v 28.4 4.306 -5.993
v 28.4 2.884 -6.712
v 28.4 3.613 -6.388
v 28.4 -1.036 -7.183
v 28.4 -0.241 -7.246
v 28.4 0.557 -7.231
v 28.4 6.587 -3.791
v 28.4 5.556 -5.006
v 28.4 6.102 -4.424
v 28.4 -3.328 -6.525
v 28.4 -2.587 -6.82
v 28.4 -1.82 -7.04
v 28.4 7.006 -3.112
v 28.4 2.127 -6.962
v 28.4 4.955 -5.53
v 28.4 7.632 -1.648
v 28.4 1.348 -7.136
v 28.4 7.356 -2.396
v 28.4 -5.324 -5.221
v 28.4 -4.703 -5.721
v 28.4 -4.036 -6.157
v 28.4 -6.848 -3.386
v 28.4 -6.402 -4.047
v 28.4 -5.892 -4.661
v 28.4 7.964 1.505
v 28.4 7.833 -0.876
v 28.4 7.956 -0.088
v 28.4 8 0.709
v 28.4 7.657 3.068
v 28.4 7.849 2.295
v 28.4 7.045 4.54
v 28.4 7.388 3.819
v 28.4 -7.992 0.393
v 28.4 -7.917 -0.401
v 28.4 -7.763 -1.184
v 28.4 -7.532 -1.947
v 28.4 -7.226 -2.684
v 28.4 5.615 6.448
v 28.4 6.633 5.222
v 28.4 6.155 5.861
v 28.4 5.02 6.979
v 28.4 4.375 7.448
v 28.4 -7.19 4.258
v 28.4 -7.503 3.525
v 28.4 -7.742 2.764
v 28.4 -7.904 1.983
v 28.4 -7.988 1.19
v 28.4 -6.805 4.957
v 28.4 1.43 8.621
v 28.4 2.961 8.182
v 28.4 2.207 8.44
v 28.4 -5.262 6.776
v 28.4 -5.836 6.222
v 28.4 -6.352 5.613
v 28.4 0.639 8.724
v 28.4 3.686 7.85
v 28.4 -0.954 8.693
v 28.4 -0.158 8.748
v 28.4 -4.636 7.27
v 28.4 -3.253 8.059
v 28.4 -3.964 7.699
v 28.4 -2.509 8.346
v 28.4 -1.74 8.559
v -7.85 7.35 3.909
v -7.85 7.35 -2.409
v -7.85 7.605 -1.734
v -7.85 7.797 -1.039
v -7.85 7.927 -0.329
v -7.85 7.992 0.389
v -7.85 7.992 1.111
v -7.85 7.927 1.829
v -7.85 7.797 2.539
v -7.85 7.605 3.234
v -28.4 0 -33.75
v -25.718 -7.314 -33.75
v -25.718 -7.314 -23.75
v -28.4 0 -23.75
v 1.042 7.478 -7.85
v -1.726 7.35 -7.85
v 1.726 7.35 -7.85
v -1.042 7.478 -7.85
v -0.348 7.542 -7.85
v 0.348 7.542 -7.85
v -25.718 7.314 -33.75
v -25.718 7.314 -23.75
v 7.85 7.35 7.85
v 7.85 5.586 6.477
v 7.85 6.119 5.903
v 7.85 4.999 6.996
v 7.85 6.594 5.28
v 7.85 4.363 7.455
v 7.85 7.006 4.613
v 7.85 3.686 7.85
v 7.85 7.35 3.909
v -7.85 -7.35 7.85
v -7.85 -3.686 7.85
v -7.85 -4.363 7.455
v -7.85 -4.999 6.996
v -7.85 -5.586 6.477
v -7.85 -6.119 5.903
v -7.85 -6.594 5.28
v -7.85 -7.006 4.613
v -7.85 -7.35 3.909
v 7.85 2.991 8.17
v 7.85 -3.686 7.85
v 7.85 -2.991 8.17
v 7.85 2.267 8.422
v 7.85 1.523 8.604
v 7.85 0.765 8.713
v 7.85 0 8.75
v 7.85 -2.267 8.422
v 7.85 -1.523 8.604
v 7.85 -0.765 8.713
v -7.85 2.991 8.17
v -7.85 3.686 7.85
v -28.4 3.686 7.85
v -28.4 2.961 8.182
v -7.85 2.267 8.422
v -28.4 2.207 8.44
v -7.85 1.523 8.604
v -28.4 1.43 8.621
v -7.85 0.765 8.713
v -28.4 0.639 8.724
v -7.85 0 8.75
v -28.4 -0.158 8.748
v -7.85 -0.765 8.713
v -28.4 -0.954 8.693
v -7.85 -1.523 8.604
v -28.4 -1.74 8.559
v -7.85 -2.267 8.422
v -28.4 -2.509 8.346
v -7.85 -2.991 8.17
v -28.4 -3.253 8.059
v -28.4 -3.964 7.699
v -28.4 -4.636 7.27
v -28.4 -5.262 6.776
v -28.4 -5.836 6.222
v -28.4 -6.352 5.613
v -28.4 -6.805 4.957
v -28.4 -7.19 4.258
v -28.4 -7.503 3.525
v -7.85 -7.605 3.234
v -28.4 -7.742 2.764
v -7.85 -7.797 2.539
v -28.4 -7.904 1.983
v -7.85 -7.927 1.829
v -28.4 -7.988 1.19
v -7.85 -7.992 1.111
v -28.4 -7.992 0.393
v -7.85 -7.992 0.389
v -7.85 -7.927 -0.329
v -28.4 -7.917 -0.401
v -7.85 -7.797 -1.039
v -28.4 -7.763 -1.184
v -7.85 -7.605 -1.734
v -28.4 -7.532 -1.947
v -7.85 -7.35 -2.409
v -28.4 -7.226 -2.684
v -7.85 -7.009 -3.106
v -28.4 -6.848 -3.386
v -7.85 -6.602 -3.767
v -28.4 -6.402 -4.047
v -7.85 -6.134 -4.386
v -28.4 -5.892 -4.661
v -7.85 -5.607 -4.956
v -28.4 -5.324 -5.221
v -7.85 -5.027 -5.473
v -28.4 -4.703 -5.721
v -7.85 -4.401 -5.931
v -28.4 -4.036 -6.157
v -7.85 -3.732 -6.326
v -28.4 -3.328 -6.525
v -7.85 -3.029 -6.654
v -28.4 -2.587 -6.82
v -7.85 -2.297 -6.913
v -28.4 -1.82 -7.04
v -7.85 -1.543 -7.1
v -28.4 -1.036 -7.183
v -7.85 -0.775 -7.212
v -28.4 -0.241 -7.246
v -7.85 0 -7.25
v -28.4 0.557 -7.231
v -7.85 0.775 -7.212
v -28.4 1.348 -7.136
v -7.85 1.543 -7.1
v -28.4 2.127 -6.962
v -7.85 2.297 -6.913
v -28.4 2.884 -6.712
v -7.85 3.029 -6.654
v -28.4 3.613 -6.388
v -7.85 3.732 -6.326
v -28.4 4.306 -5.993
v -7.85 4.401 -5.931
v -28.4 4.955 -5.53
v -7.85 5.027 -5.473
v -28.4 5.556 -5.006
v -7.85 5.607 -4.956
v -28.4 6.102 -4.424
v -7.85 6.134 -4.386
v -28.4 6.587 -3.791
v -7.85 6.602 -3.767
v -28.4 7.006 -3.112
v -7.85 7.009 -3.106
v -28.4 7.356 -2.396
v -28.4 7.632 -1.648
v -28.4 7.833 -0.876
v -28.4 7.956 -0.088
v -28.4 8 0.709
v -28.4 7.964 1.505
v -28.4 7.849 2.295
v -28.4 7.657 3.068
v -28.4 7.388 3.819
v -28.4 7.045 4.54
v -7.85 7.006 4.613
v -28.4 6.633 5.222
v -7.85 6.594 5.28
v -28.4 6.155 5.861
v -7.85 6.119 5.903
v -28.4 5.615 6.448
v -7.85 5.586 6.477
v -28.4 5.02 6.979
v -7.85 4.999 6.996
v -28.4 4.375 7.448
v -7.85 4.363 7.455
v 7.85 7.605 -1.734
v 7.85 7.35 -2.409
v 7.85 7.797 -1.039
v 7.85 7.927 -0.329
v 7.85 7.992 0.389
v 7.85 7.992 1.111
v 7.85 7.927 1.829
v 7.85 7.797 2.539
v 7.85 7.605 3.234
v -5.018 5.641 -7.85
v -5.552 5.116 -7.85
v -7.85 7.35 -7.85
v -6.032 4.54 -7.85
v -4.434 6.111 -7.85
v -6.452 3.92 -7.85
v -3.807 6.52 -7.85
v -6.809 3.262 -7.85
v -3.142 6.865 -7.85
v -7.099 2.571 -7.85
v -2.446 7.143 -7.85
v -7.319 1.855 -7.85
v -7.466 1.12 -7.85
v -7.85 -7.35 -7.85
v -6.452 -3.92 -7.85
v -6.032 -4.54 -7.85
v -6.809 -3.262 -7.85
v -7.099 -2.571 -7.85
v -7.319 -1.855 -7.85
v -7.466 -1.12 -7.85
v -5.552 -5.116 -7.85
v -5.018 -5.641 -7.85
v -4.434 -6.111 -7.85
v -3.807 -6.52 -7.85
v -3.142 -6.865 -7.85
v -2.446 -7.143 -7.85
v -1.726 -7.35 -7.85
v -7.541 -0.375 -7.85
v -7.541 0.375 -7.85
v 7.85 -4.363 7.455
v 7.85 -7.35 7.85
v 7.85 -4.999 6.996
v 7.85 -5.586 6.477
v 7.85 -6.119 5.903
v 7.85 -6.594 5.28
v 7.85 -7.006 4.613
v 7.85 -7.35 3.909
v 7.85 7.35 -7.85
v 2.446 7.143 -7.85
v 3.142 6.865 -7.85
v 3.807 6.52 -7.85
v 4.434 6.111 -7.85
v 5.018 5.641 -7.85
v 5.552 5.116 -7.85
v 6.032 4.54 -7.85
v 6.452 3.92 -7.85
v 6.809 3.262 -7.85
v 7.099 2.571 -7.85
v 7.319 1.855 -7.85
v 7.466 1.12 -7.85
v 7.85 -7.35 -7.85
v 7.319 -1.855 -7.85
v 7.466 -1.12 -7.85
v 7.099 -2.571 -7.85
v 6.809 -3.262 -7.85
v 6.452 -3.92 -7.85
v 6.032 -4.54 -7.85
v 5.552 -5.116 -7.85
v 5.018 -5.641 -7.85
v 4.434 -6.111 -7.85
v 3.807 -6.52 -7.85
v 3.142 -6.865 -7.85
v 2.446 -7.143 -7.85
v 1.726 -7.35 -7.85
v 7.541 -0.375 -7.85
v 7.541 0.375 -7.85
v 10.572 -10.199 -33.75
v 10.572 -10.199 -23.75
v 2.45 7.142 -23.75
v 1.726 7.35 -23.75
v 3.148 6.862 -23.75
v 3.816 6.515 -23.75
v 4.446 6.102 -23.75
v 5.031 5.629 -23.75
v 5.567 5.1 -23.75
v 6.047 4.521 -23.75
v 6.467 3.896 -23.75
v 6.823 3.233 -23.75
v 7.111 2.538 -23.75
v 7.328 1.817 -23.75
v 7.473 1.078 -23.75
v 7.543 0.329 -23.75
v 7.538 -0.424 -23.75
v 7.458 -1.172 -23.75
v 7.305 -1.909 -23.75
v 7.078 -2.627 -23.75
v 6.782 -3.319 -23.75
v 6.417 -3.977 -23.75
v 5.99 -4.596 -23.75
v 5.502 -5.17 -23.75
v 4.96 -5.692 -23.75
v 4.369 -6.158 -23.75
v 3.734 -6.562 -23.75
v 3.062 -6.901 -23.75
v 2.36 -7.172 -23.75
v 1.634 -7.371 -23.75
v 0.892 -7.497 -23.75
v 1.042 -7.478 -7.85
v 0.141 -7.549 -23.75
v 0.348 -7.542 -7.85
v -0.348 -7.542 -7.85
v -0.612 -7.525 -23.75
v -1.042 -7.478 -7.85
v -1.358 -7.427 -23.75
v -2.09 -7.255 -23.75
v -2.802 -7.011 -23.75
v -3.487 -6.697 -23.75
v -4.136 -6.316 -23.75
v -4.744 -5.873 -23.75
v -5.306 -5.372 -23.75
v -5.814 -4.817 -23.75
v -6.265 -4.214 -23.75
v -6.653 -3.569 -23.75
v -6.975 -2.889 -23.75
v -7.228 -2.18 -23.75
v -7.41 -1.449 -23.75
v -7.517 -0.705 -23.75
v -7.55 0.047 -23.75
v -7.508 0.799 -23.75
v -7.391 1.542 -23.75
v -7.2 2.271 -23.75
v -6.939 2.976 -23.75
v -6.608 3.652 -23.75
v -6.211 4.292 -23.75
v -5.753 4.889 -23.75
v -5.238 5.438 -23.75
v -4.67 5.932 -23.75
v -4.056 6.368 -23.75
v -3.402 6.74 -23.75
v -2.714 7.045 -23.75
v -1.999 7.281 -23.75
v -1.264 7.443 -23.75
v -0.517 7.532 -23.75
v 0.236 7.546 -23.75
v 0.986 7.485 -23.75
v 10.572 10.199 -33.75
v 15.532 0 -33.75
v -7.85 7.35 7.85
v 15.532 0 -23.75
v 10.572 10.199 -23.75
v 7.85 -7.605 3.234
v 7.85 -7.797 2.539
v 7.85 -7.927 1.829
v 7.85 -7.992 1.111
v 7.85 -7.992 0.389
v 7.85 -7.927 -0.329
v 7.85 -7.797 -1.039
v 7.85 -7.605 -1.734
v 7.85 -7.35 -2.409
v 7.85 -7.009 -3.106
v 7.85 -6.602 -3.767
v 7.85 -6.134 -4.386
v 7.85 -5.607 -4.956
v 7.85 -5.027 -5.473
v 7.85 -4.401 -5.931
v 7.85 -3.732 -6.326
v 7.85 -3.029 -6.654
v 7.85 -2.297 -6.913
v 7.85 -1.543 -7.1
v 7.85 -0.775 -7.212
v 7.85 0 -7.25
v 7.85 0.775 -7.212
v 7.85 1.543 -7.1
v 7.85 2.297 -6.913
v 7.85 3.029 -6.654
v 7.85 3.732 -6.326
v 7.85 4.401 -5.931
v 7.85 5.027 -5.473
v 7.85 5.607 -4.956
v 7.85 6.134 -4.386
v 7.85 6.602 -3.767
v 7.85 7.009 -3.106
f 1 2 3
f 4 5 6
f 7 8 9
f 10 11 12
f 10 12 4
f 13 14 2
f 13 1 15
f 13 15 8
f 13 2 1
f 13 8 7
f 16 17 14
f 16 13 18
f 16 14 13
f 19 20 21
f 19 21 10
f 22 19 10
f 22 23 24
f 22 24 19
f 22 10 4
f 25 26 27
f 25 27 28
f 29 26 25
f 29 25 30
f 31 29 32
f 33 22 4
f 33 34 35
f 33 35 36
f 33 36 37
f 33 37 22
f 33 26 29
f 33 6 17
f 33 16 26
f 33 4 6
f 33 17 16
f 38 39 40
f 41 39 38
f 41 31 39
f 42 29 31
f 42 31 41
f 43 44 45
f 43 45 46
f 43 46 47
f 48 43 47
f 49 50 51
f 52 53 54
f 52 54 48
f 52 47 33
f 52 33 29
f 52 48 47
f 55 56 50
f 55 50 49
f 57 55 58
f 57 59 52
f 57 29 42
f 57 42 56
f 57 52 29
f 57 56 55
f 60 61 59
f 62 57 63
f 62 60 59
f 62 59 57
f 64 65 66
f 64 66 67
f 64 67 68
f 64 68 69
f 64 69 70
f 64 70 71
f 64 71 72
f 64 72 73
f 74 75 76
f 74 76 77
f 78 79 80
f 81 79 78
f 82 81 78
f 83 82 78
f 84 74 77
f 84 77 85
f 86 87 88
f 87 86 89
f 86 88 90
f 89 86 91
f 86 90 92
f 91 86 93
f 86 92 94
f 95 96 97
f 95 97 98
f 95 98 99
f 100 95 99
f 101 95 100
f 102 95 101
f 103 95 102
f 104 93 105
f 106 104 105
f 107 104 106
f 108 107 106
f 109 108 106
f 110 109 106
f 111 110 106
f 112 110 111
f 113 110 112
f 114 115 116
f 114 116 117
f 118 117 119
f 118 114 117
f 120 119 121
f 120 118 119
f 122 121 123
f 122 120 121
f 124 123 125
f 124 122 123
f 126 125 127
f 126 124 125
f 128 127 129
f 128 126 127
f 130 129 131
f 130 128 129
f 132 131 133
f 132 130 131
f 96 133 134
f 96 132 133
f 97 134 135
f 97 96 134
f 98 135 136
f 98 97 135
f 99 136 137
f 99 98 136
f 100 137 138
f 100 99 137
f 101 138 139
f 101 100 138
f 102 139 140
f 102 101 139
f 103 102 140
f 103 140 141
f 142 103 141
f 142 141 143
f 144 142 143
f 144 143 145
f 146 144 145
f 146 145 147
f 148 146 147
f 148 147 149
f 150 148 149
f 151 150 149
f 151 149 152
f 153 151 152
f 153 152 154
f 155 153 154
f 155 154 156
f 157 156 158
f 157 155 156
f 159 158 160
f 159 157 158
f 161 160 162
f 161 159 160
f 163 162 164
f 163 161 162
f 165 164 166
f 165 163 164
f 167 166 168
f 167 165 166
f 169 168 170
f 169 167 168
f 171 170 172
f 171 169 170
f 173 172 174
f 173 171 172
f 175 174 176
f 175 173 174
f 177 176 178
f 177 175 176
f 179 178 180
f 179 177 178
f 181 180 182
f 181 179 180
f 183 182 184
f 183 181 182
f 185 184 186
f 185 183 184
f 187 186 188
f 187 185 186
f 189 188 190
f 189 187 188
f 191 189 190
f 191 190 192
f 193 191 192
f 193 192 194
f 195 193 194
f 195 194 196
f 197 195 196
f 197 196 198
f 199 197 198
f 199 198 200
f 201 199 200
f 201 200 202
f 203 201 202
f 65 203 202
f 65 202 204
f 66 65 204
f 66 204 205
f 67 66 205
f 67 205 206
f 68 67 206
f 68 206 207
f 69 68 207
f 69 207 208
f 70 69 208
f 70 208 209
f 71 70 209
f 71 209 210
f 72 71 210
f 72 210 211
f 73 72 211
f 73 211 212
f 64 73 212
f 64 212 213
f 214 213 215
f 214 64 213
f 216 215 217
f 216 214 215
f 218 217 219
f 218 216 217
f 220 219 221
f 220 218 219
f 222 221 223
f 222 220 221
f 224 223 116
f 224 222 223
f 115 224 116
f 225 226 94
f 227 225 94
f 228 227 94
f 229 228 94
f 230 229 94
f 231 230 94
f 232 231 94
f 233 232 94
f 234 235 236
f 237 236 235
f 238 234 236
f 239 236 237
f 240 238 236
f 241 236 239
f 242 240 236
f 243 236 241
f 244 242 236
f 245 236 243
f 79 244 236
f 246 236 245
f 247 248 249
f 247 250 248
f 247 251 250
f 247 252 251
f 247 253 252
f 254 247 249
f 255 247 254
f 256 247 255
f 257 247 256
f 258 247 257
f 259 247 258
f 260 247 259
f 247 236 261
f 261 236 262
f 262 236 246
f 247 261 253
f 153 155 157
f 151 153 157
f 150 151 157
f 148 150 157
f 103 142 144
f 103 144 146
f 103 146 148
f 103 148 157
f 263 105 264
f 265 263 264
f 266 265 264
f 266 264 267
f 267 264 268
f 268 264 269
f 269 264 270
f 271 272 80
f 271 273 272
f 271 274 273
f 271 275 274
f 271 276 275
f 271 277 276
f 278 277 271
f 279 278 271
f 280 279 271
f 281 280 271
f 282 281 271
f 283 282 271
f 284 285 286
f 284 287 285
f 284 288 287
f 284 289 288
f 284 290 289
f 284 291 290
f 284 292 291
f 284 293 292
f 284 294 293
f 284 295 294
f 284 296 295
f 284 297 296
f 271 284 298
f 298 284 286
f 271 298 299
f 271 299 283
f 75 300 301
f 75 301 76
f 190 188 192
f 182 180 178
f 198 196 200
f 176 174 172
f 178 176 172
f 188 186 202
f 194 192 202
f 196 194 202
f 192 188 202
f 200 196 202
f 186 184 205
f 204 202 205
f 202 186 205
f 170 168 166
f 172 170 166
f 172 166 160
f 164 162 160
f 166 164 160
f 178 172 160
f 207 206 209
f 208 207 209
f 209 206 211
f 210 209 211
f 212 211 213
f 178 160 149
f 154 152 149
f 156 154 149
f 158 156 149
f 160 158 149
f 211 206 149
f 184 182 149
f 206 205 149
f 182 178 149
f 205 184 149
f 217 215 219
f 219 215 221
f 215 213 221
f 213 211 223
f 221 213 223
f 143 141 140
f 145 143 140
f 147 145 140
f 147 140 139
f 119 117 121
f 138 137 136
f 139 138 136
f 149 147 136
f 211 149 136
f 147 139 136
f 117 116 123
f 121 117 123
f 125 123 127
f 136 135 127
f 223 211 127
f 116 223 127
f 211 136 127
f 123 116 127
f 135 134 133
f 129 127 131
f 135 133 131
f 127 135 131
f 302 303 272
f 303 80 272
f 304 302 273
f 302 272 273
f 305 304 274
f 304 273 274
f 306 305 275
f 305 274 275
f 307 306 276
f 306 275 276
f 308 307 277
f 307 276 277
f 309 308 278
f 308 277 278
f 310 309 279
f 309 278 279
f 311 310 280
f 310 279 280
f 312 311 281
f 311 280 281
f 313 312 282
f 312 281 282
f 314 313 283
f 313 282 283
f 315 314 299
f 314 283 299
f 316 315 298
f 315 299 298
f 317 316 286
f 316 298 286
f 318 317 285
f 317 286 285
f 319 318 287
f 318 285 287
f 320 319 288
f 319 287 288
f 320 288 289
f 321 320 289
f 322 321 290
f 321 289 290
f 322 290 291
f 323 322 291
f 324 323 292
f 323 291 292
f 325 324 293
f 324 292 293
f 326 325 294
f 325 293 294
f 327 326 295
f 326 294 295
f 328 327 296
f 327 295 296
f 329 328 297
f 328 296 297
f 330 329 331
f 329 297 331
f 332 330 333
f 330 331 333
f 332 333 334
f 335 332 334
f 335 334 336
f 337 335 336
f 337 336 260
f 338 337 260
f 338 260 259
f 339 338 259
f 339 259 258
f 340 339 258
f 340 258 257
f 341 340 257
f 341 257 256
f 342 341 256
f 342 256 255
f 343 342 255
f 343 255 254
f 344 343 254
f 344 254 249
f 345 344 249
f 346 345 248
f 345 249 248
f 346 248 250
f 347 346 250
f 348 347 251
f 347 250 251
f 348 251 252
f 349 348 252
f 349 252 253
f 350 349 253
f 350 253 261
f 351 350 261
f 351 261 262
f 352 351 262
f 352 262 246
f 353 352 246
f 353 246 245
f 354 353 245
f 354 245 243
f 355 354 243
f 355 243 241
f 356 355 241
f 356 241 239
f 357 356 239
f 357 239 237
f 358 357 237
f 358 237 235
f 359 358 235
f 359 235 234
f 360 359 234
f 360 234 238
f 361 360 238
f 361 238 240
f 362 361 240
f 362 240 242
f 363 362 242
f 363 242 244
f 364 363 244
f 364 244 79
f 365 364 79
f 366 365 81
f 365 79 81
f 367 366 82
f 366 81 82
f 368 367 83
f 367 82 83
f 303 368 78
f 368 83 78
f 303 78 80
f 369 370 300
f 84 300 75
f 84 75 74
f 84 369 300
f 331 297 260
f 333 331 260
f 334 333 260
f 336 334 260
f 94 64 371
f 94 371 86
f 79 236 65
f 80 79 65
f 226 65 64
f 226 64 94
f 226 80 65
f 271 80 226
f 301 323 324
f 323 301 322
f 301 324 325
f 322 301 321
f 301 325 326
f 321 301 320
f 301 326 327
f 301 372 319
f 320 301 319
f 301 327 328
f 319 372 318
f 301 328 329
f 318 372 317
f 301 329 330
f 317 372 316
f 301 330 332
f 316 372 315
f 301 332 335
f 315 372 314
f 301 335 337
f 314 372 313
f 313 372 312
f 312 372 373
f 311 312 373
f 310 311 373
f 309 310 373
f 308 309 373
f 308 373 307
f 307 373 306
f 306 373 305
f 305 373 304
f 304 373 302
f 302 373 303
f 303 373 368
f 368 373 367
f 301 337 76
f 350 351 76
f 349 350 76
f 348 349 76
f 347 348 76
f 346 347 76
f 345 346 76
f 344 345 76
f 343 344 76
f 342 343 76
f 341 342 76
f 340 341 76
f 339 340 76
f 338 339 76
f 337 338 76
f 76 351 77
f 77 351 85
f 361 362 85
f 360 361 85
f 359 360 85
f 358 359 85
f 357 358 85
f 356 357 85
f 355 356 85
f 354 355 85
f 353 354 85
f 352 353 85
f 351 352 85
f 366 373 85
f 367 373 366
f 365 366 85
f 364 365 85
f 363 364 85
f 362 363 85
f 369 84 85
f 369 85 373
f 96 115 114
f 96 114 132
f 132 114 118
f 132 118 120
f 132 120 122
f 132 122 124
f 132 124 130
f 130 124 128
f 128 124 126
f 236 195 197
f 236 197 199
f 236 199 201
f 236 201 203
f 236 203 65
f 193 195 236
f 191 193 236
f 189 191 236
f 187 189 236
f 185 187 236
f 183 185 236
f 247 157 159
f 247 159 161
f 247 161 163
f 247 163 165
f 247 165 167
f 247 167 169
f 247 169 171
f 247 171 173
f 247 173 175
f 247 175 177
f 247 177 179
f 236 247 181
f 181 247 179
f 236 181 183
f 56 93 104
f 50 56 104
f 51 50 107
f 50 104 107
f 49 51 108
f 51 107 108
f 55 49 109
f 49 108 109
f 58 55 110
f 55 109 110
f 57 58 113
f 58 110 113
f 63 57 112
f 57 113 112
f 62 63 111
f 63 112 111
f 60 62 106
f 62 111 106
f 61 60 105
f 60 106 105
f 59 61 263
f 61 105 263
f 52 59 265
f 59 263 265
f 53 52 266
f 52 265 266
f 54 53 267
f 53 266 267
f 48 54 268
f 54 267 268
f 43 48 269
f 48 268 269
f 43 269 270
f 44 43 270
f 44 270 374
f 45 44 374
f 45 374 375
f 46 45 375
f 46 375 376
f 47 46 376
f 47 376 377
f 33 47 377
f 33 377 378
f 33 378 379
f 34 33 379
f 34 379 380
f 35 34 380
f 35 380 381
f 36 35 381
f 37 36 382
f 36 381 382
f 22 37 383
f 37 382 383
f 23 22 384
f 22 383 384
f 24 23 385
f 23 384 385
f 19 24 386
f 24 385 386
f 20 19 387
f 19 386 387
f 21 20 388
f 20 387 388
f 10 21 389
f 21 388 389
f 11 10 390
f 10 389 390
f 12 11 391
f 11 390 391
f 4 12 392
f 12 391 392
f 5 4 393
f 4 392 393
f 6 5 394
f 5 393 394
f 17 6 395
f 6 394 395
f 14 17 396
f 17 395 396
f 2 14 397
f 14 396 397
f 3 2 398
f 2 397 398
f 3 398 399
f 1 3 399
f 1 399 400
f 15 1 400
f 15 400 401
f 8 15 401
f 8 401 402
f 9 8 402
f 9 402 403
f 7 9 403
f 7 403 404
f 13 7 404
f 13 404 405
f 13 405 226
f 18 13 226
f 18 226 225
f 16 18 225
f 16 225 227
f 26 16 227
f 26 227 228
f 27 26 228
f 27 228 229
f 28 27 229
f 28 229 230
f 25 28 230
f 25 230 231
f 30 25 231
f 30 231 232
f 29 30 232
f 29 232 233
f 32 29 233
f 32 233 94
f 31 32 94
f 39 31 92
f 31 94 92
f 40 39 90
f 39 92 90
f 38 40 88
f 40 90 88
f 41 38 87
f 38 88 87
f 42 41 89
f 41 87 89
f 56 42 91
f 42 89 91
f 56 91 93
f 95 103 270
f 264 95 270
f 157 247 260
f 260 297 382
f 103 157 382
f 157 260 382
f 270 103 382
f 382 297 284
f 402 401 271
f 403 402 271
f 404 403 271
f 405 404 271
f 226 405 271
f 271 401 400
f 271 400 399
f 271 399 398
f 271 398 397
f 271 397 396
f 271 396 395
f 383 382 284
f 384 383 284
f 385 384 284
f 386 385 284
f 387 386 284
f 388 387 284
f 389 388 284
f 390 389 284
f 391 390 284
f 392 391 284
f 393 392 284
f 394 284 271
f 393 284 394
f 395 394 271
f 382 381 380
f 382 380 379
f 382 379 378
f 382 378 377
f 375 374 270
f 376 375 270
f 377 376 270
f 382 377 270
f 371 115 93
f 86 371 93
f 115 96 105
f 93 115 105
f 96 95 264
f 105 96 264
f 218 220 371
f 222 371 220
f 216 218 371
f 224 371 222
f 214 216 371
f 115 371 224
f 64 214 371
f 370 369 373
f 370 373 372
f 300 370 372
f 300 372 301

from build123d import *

# Parameters (mm, degrees)
BOSS_EXTRUDE2_DEPTH      = 7.35
BOSS_EXTRUDE2_DEPTH_BACK = 7.35
SKETCH2_W                = 15.7
SKETCH2_H                = 15.7
SKETCH3_R                = 8
BOSS_EXTRUDE3_DEPTH      = 20.55
SKETCH4_R                = 7.55
BOSS_EXTRUDE4_DEPTH      = 25.9
BOSS_EXTRUDE5_DEPTH      = 10


with BuildPart() as part:
    # Sketch2 → Boss-Extrude2 (new, two sides: drawn at the far end of the back side and taken through both)
    with BuildSketch(Plane(origin=(0, 0, 0), x_dir=(1, 0, 0), z_dir=(0, 1, 0)).offset(-BOSS_EXTRUDE2_DEPTH_BACK)):
        Rectangle(SKETCH2_W, SKETCH2_H)
    extrude(amount=BOSS_EXTRUDE2_DEPTH + BOSS_EXTRUDE2_DEPTH_BACK)

    # Sketch3 → Boss-Extrude3 (add)
    with BuildSketch(Plane(origin=(7.85, 0, 0), x_dir=(0, 0, -1), z_dir=(1, 0, 0))):
        with Locations((-0.75, 0)):
            Circle(SKETCH3_R)
    boss_extrude3 = extrude(amount=BOSS_EXTRUDE3_DEPTH)

    # Sketch4 → Boss-Extrude4 (add)
    with BuildSketch(Plane(origin=(0, 0, -7.85), x_dir=(-1, 0, 0), z_dir=(0, 0, -1))):
        Circle(SKETCH4_R)
    extrude(amount=BOSS_EXTRUDE4_DEPTH)

    # Sketch5 → Boss-Extrude5 (add)
    with BuildSketch(Plane(origin=(0, 0, -33.75), x_dir=(-1, 0, 0), z_dir=(0, 0, -1))):
        Polygon((-15.532193585, 0), (-10.572107213, -10.198544939), (25.717504309, -7.313596743), (28.4, 0), (25.717504309, 7.313596743), (-10.572107213, 10.198544939), align=None)
    extrude(amount=-BOSS_EXTRUDE5_DEPTH)

    # Mirror1: Boss-Extrude3 across plane
    add(boss_extrude3.mirror(Plane(origin=(0, 0, 0), x_dir=(0, 0, 1), z_dir=(1, 0, 0))))


solid = part.part
